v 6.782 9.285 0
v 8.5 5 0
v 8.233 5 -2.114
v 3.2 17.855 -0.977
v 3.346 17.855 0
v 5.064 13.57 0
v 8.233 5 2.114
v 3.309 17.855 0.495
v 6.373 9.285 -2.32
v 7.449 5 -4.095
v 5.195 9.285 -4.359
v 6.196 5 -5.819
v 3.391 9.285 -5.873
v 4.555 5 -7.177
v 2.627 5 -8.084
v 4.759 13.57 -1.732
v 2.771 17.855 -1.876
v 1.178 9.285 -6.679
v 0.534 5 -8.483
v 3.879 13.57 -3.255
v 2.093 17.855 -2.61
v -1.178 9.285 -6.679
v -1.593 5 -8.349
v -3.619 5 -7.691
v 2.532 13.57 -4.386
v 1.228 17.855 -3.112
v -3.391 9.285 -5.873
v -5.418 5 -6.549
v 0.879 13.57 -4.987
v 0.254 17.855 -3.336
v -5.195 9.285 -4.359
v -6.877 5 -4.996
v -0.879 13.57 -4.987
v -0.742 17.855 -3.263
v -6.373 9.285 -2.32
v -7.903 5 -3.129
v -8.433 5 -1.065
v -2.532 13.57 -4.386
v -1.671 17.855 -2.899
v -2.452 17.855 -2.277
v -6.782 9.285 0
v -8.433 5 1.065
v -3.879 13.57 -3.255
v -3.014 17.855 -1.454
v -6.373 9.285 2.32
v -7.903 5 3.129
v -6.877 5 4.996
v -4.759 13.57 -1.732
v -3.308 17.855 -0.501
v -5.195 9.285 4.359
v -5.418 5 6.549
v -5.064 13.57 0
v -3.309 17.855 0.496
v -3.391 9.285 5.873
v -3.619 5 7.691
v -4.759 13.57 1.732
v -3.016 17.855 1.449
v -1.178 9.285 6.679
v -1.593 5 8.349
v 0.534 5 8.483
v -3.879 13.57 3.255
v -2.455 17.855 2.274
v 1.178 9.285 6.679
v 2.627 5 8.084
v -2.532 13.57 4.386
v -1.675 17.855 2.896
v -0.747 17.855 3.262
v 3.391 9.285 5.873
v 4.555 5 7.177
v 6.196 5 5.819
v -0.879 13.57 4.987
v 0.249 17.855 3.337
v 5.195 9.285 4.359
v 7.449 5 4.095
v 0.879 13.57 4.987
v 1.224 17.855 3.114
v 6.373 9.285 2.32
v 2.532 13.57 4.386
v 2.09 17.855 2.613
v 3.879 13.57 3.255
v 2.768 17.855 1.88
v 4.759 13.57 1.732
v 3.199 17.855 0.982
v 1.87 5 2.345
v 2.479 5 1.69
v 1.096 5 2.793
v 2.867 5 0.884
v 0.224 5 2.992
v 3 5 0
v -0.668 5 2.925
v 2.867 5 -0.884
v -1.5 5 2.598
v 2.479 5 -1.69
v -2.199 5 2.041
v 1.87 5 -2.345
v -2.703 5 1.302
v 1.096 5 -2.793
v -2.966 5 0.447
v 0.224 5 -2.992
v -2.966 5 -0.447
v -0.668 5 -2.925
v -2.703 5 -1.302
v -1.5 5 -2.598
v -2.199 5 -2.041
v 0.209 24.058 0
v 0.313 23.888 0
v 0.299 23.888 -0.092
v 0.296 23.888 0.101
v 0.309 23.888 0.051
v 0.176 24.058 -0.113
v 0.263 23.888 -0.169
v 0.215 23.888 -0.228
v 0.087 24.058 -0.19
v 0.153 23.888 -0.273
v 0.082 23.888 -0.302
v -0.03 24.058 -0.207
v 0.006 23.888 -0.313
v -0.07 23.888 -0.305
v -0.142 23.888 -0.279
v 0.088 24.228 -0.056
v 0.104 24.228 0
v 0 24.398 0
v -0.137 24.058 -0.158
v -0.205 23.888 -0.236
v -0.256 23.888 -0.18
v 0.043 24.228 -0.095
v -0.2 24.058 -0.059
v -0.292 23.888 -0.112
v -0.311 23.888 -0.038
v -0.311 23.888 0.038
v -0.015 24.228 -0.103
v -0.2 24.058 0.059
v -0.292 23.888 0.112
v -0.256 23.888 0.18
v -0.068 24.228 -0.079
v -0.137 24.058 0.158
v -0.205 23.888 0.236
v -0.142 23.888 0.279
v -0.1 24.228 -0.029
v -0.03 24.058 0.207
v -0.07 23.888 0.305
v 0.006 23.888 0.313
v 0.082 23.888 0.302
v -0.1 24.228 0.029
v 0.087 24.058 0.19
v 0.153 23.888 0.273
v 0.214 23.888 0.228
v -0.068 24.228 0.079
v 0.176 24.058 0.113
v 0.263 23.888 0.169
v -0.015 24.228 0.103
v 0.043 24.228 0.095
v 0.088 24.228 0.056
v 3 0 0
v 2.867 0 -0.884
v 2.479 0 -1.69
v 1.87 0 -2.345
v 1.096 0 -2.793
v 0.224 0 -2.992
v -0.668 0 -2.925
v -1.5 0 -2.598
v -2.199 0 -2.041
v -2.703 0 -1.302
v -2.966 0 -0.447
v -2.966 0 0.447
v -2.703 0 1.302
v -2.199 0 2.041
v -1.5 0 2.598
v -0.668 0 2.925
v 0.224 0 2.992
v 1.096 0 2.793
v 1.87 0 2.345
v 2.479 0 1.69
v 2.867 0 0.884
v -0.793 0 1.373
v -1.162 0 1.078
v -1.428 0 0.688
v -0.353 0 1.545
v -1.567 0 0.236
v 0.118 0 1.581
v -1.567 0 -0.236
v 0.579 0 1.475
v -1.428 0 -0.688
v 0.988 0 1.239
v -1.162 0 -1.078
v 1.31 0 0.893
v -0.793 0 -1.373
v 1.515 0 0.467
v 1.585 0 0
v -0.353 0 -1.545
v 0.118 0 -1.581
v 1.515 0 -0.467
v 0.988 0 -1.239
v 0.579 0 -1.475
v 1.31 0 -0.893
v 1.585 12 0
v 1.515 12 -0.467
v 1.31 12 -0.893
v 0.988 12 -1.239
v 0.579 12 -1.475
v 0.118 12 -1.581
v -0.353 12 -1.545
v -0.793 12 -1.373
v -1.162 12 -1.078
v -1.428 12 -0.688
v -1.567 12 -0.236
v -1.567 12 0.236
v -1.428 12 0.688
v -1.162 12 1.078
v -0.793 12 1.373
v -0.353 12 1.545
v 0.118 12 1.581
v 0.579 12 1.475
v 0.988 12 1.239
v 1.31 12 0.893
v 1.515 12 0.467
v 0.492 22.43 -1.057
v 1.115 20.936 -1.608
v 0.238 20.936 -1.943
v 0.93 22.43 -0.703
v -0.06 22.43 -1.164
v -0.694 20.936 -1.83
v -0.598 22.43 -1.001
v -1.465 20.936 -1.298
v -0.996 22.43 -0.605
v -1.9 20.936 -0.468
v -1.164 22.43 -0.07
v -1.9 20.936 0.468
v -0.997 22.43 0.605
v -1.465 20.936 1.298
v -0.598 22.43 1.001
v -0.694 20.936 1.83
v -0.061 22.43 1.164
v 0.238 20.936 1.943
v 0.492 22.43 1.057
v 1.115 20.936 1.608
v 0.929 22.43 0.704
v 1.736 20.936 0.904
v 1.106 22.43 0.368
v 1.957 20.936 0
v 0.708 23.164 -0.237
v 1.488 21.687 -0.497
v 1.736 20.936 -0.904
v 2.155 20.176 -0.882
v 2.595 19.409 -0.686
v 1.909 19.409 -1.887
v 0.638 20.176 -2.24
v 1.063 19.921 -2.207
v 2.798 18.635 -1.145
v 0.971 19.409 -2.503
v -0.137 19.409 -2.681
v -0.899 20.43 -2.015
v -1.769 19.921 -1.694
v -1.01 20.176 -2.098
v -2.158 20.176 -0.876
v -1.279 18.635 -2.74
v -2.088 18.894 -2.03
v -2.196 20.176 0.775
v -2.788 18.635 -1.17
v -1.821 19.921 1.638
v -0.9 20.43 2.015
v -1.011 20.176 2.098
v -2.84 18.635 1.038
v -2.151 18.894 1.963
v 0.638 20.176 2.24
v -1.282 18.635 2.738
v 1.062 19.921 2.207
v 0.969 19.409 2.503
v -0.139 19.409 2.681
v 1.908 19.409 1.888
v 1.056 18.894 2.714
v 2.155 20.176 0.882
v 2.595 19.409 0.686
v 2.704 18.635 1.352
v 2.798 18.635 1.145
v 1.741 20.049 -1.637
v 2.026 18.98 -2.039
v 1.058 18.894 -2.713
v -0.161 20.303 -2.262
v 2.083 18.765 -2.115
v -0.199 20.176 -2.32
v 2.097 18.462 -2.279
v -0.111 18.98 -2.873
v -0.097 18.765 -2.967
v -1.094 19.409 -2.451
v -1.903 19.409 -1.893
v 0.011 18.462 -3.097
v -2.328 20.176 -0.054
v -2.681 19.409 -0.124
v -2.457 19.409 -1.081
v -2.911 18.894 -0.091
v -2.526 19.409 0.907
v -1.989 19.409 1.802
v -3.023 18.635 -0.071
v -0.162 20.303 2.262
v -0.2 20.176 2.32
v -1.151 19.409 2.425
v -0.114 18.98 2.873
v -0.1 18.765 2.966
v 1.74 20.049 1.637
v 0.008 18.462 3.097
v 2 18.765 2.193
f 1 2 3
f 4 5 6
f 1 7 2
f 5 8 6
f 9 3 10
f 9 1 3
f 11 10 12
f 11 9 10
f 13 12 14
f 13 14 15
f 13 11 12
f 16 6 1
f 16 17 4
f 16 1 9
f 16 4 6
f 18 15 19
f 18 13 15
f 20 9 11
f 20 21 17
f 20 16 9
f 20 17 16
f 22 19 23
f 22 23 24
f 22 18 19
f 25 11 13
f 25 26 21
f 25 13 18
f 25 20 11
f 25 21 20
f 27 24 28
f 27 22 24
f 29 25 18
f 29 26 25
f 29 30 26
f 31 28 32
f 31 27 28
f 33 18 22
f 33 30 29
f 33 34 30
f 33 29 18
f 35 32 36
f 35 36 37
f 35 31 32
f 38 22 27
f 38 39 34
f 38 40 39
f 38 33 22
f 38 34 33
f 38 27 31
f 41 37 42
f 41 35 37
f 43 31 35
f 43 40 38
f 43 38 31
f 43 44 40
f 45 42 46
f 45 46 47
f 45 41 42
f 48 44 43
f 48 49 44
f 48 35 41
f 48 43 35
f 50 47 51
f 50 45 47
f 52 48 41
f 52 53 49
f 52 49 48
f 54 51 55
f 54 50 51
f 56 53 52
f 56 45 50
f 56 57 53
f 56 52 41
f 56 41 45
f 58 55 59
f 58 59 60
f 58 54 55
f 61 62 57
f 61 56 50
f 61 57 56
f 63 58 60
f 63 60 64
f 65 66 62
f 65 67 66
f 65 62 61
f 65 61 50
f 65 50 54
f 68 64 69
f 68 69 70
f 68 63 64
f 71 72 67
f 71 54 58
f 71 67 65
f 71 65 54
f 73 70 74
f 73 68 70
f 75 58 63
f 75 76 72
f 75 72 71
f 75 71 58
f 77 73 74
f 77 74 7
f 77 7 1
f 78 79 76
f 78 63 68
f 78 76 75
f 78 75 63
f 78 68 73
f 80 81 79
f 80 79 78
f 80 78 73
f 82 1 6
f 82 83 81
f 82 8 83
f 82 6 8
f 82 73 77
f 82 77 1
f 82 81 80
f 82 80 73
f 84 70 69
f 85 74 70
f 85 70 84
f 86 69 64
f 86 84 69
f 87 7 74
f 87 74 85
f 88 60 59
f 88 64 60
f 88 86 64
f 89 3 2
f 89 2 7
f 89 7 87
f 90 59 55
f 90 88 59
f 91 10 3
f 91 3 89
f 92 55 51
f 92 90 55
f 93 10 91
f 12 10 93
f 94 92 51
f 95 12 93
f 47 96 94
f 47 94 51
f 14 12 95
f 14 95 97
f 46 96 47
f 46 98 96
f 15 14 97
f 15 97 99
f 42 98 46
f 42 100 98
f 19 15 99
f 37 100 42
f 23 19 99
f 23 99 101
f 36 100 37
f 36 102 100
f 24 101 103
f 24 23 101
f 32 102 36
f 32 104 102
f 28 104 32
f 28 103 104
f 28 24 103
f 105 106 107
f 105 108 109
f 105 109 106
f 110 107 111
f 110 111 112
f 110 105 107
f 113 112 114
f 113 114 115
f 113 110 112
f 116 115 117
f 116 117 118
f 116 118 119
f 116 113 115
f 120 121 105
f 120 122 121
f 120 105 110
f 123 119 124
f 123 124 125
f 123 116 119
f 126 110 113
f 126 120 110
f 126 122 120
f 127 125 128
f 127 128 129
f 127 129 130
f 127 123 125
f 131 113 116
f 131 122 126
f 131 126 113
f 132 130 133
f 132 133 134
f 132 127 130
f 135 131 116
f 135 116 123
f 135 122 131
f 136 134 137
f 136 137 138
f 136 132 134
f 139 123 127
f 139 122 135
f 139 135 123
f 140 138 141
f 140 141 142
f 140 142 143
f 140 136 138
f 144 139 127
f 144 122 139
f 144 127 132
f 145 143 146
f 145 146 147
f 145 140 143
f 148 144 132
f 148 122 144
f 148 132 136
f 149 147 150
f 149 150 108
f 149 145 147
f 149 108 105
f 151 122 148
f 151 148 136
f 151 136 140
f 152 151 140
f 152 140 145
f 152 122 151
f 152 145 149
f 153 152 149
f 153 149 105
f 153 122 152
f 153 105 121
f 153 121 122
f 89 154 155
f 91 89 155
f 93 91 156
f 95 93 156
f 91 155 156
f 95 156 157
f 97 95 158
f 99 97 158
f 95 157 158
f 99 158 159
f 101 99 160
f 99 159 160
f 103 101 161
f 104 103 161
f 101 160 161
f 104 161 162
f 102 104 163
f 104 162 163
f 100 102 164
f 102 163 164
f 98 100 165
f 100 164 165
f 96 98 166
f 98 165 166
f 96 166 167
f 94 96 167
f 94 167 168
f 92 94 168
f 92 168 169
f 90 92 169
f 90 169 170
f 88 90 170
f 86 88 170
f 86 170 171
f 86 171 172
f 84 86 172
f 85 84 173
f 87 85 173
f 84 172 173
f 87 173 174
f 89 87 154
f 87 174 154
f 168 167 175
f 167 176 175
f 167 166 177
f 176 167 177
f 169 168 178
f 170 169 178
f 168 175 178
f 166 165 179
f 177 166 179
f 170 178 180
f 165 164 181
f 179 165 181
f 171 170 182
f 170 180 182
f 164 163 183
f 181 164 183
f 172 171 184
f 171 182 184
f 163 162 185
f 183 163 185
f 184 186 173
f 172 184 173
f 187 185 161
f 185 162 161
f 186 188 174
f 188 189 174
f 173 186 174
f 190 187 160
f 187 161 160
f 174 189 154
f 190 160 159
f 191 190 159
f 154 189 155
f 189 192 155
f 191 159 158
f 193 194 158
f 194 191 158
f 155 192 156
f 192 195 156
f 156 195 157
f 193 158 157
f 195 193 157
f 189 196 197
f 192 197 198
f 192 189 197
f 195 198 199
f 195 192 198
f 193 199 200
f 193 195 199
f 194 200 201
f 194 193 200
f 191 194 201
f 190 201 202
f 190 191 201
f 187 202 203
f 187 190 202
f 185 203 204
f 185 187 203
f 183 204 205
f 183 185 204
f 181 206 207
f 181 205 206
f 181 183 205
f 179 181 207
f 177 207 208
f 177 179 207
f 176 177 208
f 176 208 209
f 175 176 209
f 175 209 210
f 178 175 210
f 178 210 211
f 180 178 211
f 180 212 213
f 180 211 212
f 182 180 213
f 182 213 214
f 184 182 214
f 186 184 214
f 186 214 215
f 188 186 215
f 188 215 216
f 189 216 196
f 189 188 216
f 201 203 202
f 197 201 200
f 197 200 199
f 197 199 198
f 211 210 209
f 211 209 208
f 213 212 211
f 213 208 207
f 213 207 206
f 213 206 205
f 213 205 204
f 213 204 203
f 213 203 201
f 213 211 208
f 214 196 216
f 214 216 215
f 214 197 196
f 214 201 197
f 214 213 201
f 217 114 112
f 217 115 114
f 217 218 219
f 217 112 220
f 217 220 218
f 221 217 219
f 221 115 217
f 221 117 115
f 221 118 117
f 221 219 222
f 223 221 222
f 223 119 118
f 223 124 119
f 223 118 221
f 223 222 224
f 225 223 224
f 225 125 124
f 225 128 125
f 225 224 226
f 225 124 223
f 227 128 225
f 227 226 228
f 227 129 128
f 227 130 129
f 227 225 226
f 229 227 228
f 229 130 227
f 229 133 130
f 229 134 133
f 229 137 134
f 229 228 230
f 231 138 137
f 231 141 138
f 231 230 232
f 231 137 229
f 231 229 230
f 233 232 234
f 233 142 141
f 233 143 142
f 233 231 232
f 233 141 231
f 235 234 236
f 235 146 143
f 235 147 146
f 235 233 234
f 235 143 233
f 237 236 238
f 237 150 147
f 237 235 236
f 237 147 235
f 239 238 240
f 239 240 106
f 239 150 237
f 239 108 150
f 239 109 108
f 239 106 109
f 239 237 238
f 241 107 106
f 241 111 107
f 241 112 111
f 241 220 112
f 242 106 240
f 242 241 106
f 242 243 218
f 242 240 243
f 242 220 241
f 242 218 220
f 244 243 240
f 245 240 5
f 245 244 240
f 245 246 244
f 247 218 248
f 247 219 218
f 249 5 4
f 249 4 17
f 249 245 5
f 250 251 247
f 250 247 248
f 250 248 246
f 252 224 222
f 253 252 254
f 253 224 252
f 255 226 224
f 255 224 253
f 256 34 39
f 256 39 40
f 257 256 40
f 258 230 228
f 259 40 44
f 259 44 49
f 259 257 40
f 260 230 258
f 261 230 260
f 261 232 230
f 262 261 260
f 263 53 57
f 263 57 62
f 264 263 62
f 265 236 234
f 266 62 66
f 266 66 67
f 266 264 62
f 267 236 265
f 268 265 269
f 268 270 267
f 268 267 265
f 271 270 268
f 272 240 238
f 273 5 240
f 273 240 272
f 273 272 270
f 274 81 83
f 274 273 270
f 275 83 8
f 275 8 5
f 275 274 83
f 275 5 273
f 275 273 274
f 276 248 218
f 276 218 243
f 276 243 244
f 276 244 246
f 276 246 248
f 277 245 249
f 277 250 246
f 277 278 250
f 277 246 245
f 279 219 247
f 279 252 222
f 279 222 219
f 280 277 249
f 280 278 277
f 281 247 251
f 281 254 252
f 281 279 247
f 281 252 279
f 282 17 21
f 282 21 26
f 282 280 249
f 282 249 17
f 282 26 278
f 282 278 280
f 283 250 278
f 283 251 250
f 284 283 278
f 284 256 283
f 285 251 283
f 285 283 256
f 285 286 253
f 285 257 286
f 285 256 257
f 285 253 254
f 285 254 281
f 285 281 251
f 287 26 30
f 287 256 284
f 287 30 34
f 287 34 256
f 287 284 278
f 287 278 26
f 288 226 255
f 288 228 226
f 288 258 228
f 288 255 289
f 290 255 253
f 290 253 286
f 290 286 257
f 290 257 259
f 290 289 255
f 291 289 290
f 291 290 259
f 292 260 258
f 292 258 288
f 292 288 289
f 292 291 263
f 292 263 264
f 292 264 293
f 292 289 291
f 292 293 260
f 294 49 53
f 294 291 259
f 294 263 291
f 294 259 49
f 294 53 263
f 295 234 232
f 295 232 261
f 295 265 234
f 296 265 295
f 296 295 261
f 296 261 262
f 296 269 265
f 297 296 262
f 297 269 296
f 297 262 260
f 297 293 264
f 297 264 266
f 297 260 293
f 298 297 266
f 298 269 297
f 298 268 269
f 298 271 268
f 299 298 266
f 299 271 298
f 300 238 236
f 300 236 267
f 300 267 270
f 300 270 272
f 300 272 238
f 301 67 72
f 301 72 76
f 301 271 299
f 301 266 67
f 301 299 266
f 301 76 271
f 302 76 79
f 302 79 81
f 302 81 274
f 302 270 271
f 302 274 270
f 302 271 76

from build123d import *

# Parameters (mm, degrees)
SKETCH1_R           = 3
SKETCH1_R_2         = 1.585
BOSS_EXTRUDE1_DEPTH = 5
FILLET1_R           = 40
SKETCH8_R           = 1.585
CUT_EXTRUDE1_DEPTH  = 7


with BuildPart() as part:
    # Sketch1 → Boss-Extrude1 (new body)
    with BuildSketch(Plane(origin=(0, 0, 0), x_dir=(1, 0, 0), z_dir=(0, 1, 0))):
        Circle(SKETCH1_R)
        Circle(SKETCH1_R_2, mode=Mode.SUBTRACT)
    extrude(amount=BOSS_EXTRUDE1_DEPTH)

    # Sketch4 → Revolve6 (revolve)
    with BuildSketch(Plane.XY):
        Polygon((8.5, 5), (2.085, 21), (0, 21), (0, 5), align=None)
    revolve(axis=Axis((0, 5, 0), (0, 1, 0)))

    # Sketch7 → Revolve7 (revolve)
    with BuildSketch(Plane.XY):
        Polygon((0, 21), (2.085, 21), (0, 24.39818393), align=None)
    revolve(axis=Axis((0, 21, 0), (0, 1, 0)))

    # Fillet1
    fillet1_edges = [part.edges().sort_by_distance(p)[0] for p in [
        (-2.085, 21, 0),
    ]]
    fillet(fillet1_edges, radius=FILLET1_R)

    # Sketch8 → Cut-Extrude1 (cut)
    with BuildSketch(Plane.XZ.offset(-5)):
        Circle(SKETCH8_R)
    extrude(amount=-CUT_EXTRUDE1_DEPTH, mode=Mode.SUBTRACT)


solid = part.part
